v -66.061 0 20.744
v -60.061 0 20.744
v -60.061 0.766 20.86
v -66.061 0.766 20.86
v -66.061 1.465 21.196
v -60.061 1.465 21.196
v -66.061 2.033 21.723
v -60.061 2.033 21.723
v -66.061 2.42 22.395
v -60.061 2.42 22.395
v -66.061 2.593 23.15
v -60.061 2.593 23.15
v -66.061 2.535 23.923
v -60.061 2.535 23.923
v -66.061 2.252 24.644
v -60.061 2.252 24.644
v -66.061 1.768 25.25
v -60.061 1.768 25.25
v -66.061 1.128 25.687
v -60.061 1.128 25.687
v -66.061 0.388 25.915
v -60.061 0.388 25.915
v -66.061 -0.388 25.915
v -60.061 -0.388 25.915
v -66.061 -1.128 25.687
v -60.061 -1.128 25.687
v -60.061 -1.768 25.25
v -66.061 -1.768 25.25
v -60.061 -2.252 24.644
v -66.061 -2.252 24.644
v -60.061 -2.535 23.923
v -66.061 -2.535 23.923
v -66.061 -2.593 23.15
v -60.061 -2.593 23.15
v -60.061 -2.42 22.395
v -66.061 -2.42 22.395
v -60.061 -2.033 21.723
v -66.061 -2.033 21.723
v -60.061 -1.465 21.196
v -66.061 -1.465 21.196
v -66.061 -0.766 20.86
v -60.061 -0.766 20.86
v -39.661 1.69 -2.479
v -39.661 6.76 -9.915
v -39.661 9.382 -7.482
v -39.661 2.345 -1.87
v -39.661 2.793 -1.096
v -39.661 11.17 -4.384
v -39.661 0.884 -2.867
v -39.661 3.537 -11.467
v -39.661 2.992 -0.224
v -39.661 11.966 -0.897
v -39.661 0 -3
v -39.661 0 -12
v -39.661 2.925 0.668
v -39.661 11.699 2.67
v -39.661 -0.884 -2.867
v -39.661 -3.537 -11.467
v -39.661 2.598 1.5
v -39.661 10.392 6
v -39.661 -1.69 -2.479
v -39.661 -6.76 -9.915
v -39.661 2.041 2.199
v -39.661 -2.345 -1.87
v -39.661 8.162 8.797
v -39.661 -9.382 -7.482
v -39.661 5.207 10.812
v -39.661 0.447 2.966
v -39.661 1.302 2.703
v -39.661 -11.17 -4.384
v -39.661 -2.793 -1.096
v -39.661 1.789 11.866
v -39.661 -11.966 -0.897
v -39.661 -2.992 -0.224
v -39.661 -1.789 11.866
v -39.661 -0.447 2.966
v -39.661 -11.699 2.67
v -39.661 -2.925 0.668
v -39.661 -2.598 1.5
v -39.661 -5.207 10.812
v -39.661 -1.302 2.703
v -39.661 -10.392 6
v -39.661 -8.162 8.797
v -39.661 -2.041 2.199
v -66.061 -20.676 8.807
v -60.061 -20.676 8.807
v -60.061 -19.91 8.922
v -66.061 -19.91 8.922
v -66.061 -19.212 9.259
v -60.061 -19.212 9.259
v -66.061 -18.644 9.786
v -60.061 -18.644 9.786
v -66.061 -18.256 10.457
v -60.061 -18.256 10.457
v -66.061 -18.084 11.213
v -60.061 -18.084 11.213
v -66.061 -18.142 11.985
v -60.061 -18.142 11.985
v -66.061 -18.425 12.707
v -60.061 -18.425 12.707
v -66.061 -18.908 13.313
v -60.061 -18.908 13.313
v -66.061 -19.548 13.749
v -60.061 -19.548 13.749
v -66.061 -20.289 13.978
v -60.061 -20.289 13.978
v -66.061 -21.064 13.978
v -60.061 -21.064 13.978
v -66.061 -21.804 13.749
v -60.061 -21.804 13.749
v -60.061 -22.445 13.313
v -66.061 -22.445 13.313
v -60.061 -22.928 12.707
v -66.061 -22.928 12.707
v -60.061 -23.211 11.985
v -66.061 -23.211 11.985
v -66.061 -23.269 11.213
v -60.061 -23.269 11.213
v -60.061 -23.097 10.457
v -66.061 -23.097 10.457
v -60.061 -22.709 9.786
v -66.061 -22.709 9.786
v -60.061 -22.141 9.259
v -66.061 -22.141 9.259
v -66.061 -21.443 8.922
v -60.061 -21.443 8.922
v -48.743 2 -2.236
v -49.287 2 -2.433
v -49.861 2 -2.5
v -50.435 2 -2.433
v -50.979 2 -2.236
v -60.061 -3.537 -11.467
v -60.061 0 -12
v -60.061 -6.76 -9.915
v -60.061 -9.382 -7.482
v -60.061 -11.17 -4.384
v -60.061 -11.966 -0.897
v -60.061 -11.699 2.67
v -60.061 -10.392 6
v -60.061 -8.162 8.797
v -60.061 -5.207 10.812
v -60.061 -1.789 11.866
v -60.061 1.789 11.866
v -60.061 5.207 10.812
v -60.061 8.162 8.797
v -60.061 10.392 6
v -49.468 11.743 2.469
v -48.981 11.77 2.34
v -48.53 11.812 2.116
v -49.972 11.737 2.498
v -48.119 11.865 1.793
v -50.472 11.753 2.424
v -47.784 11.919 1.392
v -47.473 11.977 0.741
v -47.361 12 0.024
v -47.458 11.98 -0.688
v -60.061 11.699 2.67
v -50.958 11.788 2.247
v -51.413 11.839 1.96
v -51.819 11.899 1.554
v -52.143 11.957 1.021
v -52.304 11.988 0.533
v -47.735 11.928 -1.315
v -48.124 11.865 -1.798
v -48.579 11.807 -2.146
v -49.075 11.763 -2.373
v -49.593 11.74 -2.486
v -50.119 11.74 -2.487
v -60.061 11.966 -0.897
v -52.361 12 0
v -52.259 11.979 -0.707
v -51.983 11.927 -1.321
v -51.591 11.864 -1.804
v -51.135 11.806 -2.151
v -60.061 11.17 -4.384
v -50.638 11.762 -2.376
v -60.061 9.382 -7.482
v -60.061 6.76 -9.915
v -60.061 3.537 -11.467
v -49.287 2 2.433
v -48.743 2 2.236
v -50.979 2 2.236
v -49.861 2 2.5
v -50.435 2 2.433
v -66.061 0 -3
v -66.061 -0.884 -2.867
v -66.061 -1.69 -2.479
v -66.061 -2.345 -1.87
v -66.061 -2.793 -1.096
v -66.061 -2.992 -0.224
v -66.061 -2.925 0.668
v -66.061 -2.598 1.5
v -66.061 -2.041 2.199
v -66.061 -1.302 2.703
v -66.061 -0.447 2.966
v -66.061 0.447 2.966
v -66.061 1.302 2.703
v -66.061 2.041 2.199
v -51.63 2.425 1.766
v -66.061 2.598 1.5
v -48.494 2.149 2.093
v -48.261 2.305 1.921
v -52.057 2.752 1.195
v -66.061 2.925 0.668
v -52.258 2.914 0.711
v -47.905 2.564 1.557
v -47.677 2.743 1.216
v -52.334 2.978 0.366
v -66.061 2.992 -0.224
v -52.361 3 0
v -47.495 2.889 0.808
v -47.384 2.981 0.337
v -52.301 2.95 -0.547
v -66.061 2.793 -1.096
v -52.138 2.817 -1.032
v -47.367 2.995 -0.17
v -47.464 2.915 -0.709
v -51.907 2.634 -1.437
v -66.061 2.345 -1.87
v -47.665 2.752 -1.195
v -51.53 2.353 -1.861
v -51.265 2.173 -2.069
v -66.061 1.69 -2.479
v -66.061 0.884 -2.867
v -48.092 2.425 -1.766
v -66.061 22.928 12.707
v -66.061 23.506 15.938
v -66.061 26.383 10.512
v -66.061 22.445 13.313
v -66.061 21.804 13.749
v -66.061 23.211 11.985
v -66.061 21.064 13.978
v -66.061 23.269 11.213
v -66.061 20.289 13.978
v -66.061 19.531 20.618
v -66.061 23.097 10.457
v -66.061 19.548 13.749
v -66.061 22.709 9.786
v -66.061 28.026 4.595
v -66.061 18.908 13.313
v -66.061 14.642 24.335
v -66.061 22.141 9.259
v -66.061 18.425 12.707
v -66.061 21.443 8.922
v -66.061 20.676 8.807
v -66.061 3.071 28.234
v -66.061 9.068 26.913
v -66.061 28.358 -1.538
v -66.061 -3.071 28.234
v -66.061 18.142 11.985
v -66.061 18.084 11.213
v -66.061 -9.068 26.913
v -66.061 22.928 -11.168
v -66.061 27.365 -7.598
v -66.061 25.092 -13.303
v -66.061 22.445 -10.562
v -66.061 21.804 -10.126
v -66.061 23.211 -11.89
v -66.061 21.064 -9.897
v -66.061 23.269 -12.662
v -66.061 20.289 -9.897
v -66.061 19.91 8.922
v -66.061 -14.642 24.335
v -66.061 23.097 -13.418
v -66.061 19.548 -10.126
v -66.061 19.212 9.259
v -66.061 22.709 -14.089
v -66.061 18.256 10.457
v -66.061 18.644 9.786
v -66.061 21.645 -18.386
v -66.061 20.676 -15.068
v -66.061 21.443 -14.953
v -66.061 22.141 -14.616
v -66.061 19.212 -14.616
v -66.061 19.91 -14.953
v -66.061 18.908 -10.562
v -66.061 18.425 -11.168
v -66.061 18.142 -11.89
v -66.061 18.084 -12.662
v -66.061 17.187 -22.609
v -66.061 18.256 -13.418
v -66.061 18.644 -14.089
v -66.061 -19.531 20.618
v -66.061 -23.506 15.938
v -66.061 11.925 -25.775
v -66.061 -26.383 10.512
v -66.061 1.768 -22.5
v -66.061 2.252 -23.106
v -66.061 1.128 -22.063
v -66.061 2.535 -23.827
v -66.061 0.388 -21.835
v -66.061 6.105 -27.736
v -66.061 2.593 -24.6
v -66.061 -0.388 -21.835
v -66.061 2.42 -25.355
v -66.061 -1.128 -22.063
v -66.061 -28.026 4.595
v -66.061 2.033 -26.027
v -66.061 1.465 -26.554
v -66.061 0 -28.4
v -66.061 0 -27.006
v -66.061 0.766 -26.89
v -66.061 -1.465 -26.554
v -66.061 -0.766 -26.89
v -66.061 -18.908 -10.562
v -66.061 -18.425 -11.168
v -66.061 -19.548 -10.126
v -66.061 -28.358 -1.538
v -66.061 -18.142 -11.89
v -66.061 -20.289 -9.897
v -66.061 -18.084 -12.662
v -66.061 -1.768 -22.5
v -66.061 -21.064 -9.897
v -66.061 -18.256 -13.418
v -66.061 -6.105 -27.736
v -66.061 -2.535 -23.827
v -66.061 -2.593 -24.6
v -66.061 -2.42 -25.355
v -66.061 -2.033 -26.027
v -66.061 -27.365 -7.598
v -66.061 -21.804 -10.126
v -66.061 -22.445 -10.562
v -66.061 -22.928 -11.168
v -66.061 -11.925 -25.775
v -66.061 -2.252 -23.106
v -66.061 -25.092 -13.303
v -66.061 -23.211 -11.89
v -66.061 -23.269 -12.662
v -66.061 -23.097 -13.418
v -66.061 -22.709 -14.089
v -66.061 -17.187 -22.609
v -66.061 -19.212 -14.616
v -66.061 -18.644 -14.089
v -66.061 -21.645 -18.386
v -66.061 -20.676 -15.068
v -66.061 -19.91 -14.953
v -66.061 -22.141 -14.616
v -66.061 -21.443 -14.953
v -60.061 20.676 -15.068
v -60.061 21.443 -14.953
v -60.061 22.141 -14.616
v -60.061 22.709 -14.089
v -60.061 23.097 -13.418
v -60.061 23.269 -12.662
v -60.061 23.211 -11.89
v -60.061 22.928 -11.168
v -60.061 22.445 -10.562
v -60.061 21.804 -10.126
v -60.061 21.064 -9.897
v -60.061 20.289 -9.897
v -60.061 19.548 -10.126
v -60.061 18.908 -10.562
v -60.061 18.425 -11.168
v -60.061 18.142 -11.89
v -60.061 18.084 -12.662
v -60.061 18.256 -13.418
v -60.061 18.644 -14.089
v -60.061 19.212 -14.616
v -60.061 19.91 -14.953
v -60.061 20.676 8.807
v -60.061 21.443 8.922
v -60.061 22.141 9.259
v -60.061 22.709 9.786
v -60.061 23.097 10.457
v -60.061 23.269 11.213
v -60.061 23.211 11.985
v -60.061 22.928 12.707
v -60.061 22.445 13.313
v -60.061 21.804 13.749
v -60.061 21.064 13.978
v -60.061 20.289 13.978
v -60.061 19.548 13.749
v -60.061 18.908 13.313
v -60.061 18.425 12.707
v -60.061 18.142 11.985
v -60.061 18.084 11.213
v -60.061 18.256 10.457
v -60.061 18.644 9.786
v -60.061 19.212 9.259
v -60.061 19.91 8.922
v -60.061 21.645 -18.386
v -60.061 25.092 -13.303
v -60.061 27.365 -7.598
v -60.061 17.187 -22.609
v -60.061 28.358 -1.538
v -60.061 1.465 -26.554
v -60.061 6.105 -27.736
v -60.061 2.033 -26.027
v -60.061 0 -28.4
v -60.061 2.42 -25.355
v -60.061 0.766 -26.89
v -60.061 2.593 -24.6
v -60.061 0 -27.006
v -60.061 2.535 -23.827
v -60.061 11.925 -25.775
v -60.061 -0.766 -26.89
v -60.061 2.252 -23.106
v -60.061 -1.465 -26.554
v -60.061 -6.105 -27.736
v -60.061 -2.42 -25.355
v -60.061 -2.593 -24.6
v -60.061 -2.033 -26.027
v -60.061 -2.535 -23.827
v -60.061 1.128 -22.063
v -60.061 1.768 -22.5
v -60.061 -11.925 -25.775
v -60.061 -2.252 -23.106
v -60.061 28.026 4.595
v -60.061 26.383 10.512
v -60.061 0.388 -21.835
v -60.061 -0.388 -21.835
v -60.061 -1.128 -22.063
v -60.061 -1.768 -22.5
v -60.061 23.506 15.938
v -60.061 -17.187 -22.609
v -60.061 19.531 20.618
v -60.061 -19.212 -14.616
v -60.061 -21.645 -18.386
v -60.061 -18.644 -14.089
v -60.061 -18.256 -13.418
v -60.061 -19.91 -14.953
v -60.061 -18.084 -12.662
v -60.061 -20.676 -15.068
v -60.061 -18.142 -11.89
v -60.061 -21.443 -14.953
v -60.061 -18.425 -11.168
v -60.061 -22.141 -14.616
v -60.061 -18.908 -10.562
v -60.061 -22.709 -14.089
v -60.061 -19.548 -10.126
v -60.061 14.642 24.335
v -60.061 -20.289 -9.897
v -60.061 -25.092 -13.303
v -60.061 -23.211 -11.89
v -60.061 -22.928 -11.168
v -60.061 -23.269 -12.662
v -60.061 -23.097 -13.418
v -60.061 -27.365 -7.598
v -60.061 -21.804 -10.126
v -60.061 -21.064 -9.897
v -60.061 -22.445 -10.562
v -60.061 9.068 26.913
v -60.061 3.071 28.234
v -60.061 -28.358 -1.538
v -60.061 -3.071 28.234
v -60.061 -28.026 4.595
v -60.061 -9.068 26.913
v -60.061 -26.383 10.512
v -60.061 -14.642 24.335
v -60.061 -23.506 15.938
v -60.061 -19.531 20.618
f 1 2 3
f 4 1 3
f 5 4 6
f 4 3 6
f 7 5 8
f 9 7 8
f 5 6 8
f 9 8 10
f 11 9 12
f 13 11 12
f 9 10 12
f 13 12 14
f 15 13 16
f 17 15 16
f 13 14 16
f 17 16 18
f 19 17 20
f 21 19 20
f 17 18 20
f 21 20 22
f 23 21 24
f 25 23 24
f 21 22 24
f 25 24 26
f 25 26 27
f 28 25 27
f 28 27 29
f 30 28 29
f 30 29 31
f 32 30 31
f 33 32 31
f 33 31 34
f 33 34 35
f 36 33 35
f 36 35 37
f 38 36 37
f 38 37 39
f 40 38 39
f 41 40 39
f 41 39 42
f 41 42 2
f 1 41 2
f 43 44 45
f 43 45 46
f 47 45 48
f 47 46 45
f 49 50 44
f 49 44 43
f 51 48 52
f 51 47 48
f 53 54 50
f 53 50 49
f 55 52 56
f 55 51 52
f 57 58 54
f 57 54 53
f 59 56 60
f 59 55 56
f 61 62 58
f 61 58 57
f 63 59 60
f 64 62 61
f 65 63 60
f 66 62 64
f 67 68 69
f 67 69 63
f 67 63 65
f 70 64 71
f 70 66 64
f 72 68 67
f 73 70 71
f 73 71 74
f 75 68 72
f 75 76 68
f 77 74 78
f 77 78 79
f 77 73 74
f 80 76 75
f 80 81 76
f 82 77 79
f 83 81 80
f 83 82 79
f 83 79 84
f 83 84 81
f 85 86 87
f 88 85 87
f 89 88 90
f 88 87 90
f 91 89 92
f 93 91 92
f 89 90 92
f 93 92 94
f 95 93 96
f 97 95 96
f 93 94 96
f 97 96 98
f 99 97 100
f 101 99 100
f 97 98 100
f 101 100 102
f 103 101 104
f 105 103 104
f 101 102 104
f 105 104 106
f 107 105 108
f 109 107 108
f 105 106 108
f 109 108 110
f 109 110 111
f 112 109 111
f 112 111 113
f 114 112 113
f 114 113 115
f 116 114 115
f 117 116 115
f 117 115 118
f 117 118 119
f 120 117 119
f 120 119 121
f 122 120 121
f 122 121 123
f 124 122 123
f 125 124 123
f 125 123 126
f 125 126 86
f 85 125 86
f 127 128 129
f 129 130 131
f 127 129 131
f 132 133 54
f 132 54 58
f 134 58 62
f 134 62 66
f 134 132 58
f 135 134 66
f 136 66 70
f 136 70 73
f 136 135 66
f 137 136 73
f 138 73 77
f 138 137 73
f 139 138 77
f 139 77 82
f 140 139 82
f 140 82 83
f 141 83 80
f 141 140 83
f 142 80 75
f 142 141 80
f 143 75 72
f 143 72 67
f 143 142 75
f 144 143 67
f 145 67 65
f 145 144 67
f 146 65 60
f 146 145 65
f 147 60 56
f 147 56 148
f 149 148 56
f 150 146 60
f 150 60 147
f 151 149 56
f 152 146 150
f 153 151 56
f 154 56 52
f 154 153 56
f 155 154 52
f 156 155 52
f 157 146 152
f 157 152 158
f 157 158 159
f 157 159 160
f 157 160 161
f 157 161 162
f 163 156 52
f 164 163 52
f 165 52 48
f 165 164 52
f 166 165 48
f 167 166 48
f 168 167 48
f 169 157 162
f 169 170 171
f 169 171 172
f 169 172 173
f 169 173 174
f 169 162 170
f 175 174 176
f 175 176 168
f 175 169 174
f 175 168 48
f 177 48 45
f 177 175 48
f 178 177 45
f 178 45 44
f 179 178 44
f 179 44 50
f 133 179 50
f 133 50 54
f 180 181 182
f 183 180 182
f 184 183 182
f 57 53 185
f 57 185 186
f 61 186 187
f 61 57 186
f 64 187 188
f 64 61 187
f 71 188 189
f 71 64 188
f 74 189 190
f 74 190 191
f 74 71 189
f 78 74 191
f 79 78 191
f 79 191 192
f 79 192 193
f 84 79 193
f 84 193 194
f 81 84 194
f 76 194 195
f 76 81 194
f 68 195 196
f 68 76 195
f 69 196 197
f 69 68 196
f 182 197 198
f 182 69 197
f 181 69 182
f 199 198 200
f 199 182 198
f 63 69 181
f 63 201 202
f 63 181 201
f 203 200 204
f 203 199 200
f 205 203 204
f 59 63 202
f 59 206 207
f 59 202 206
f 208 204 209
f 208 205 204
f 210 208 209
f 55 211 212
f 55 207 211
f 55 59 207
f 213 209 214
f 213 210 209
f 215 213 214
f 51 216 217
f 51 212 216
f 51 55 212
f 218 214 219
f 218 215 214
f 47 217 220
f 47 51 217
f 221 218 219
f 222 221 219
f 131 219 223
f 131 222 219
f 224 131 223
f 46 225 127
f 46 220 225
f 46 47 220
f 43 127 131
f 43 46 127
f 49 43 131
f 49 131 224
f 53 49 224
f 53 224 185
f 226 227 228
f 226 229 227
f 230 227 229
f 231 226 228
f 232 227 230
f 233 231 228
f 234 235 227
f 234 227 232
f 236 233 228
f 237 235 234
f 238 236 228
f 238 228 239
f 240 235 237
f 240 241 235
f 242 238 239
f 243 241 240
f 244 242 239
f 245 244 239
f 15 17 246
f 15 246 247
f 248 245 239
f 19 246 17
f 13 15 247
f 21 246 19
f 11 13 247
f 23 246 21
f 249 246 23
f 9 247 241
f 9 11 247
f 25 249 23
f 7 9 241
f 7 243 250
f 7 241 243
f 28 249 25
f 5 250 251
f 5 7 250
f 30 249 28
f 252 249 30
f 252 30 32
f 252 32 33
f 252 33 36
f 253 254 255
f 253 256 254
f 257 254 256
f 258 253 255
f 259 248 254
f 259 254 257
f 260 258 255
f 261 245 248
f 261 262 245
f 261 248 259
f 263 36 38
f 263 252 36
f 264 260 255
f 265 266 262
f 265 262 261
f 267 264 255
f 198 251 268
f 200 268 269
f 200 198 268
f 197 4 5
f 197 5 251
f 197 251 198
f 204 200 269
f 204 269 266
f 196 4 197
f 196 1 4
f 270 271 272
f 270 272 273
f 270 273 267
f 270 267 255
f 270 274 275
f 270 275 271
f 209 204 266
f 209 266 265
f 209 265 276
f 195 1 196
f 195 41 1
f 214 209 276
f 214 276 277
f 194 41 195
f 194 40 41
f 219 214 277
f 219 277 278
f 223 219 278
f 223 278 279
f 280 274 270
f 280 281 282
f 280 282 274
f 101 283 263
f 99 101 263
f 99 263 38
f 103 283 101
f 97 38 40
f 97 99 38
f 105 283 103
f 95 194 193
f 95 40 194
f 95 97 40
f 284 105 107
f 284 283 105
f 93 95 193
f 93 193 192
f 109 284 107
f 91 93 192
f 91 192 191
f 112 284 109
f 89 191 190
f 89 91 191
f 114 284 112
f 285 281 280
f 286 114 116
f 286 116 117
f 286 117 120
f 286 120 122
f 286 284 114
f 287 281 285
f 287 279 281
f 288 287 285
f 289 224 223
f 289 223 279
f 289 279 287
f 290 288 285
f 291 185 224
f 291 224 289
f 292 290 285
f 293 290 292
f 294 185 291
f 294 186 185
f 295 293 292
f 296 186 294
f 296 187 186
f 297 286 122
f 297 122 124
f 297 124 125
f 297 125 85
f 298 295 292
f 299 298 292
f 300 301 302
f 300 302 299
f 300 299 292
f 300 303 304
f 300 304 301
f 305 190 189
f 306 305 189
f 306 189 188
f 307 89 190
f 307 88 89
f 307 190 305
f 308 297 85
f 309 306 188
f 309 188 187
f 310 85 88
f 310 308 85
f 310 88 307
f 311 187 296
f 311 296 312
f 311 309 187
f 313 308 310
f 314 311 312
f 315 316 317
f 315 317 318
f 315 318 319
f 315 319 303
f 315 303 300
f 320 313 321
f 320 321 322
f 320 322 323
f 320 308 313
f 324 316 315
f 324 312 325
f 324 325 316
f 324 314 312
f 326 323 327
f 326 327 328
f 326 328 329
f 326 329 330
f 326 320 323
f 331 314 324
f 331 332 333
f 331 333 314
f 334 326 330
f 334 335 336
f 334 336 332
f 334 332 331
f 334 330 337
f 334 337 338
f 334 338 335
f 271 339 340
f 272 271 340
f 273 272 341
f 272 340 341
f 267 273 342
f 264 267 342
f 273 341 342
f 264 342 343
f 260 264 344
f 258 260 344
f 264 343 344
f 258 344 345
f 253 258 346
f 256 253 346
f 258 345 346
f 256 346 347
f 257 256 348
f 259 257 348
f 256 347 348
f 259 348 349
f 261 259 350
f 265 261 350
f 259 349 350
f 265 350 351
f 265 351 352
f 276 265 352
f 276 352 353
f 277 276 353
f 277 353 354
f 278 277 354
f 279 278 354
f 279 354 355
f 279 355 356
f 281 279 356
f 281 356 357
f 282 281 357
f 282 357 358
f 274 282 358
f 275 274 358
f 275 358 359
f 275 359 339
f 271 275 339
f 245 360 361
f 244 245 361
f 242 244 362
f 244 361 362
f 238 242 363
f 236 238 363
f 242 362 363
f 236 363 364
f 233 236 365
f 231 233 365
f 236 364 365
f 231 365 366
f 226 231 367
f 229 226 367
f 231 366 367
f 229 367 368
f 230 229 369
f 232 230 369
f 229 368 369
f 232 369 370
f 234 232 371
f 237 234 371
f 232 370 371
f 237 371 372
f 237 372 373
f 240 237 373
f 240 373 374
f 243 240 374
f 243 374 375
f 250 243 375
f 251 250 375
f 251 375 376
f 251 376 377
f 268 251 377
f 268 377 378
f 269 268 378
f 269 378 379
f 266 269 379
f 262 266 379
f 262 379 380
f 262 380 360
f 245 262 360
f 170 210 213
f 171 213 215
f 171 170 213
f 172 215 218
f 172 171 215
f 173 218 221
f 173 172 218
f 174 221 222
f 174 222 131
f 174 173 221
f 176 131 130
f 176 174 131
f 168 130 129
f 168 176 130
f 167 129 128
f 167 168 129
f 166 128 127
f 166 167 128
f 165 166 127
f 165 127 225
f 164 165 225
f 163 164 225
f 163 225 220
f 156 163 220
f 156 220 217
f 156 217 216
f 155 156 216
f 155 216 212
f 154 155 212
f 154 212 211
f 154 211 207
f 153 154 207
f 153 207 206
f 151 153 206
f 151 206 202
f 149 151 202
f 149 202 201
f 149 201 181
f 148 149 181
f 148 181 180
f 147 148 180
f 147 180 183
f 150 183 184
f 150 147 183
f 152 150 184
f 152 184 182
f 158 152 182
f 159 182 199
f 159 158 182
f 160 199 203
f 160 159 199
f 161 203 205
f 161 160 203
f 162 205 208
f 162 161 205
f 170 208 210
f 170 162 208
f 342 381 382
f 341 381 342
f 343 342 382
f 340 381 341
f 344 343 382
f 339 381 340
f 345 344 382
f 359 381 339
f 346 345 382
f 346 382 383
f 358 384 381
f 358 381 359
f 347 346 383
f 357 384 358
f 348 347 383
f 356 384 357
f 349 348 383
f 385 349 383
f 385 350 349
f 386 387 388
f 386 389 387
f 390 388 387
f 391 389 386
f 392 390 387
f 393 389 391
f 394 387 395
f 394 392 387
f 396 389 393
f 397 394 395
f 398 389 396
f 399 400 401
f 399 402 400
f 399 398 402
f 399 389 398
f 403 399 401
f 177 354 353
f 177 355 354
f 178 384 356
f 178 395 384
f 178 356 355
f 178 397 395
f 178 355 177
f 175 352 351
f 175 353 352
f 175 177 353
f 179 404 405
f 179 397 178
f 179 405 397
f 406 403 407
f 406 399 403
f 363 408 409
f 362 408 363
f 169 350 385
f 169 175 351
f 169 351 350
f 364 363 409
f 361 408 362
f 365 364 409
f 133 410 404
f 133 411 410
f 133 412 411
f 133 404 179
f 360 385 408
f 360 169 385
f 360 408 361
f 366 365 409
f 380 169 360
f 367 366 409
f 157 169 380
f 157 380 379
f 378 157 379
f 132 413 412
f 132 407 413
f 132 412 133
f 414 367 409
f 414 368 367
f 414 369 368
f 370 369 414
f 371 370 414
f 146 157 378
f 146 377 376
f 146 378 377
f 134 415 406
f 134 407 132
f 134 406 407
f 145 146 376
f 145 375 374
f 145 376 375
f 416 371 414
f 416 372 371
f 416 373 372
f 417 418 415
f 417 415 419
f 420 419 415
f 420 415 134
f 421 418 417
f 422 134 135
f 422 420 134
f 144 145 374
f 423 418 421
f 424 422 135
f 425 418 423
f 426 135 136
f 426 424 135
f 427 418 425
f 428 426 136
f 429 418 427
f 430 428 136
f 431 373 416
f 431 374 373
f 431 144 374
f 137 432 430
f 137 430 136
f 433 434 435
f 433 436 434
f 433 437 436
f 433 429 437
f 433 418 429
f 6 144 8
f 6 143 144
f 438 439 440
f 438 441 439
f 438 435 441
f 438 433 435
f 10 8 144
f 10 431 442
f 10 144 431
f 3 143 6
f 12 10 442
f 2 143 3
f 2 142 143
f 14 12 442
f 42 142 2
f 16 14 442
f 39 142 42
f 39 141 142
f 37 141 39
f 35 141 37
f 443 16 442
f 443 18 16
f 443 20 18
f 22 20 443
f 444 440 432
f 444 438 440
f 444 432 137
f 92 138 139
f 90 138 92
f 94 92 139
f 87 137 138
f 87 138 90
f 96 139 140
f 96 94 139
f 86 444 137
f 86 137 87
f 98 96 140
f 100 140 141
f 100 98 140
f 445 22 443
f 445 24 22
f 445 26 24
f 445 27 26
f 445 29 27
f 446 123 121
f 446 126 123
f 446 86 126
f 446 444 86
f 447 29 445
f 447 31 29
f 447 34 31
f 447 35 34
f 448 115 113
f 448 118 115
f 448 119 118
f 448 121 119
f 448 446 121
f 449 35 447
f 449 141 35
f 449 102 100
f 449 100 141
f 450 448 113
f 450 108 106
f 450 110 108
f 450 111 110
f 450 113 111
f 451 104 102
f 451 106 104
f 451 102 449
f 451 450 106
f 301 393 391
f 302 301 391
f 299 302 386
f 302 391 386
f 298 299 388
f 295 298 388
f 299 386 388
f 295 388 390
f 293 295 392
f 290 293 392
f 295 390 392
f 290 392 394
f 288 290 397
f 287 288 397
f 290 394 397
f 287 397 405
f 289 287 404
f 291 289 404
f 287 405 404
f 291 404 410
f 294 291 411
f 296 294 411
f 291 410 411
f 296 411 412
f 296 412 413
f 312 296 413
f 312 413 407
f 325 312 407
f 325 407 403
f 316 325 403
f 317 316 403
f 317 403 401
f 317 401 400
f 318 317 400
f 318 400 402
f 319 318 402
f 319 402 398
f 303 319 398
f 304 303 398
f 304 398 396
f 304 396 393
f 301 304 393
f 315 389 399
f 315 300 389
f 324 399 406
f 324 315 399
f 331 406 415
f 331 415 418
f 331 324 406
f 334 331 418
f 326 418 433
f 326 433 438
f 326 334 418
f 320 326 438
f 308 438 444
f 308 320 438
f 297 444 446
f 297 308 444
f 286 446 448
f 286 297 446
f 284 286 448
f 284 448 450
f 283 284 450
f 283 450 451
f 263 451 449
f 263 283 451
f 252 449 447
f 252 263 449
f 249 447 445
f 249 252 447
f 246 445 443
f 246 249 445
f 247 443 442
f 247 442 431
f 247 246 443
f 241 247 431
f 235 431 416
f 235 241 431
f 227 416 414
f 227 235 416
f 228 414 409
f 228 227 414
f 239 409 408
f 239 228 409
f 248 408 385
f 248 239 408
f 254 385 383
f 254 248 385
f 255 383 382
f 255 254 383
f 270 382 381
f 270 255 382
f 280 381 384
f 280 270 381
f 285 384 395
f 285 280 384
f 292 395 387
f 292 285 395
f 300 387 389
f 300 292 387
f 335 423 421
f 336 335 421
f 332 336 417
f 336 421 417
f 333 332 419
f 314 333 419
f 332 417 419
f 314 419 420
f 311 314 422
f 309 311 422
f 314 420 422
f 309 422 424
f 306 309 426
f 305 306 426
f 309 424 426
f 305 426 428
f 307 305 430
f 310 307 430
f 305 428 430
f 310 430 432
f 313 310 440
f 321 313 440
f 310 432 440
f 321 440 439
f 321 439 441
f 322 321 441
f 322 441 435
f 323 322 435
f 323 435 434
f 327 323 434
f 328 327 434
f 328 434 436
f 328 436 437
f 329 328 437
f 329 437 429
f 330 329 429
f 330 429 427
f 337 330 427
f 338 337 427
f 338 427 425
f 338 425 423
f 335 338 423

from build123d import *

# Parameters (mm, degrees)
ESQUISSE2_R             = 2.6
ENL_V_MAT_EXTRU_1_DEPTH = 10
ESQUISSE3_R             = 2.5
ENL_V_MAT_EXTRU_2_DEPTH = 10


with BuildPart() as part:
    # Esquisse1 → Révolution1 (revolve)
    with BuildSketch(Plane.XY, mode=Mode.PRIVATE) as r_volution1_sk:
        Polygon((-39.661027285, 12), (-60.061027285, 12), (-60.061027285, 28.4), (-66.061027285, 28.4), (-66.061027285, 3), (-39.661027285, 3), align=None)
    revolve(r_volution1_sk.sketch.rotate(Axis((54.367533201, 0, 0), (-1, 0, 0)), 90), axis=Axis((54.367533201, 0, 0), (-1, 0, 0)))

    # Esquisse2 → Enlèv. mat.-Extru.1 (cut)
    with BuildSketch(Plane(origin=(-60.061027285, 0, 0), x_dir=(0, 0, -1), z_dir=(1, 0, 0))):
        with Locations((-23.344444301, 0)):
            Circle(ESQUISSE2_R)
        with Locations((-11.406944301, 20.676356515)):
            Circle(ESQUISSE2_R)
        with Locations((12.468055699, 20.676356515)):
            Circle(ESQUISSE2_R)
        with Locations((24.405555699, 0)):
            Circle(ESQUISSE2_R)
        with Locations((12.468055699, -20.676356515)):
            Circle(ESQUISSE2_R)
        with Locations((-11.406944301, -20.676356515)):
            Circle(ESQUISSE2_R)
    extrude(amount=-ENL_V_MAT_EXTRU_1_DEPTH, mode=Mode.SUBTRACT)

    # Esquisse3 → Enlèv. mat.-Extru.2 (cut)
    with BuildSketch(Plane(origin=(0, 12, 0), x_dir=(-1, 0, 0), z_dir=(0, -1, 0))):
        with Locations((49.861027285, 0)):
            Circle(ESQUISSE3_R)
    extrude(amount=ENL_V_MAT_EXTRU_2_DEPTH, mode=Mode.SUBTRACT)


solid = part.part
